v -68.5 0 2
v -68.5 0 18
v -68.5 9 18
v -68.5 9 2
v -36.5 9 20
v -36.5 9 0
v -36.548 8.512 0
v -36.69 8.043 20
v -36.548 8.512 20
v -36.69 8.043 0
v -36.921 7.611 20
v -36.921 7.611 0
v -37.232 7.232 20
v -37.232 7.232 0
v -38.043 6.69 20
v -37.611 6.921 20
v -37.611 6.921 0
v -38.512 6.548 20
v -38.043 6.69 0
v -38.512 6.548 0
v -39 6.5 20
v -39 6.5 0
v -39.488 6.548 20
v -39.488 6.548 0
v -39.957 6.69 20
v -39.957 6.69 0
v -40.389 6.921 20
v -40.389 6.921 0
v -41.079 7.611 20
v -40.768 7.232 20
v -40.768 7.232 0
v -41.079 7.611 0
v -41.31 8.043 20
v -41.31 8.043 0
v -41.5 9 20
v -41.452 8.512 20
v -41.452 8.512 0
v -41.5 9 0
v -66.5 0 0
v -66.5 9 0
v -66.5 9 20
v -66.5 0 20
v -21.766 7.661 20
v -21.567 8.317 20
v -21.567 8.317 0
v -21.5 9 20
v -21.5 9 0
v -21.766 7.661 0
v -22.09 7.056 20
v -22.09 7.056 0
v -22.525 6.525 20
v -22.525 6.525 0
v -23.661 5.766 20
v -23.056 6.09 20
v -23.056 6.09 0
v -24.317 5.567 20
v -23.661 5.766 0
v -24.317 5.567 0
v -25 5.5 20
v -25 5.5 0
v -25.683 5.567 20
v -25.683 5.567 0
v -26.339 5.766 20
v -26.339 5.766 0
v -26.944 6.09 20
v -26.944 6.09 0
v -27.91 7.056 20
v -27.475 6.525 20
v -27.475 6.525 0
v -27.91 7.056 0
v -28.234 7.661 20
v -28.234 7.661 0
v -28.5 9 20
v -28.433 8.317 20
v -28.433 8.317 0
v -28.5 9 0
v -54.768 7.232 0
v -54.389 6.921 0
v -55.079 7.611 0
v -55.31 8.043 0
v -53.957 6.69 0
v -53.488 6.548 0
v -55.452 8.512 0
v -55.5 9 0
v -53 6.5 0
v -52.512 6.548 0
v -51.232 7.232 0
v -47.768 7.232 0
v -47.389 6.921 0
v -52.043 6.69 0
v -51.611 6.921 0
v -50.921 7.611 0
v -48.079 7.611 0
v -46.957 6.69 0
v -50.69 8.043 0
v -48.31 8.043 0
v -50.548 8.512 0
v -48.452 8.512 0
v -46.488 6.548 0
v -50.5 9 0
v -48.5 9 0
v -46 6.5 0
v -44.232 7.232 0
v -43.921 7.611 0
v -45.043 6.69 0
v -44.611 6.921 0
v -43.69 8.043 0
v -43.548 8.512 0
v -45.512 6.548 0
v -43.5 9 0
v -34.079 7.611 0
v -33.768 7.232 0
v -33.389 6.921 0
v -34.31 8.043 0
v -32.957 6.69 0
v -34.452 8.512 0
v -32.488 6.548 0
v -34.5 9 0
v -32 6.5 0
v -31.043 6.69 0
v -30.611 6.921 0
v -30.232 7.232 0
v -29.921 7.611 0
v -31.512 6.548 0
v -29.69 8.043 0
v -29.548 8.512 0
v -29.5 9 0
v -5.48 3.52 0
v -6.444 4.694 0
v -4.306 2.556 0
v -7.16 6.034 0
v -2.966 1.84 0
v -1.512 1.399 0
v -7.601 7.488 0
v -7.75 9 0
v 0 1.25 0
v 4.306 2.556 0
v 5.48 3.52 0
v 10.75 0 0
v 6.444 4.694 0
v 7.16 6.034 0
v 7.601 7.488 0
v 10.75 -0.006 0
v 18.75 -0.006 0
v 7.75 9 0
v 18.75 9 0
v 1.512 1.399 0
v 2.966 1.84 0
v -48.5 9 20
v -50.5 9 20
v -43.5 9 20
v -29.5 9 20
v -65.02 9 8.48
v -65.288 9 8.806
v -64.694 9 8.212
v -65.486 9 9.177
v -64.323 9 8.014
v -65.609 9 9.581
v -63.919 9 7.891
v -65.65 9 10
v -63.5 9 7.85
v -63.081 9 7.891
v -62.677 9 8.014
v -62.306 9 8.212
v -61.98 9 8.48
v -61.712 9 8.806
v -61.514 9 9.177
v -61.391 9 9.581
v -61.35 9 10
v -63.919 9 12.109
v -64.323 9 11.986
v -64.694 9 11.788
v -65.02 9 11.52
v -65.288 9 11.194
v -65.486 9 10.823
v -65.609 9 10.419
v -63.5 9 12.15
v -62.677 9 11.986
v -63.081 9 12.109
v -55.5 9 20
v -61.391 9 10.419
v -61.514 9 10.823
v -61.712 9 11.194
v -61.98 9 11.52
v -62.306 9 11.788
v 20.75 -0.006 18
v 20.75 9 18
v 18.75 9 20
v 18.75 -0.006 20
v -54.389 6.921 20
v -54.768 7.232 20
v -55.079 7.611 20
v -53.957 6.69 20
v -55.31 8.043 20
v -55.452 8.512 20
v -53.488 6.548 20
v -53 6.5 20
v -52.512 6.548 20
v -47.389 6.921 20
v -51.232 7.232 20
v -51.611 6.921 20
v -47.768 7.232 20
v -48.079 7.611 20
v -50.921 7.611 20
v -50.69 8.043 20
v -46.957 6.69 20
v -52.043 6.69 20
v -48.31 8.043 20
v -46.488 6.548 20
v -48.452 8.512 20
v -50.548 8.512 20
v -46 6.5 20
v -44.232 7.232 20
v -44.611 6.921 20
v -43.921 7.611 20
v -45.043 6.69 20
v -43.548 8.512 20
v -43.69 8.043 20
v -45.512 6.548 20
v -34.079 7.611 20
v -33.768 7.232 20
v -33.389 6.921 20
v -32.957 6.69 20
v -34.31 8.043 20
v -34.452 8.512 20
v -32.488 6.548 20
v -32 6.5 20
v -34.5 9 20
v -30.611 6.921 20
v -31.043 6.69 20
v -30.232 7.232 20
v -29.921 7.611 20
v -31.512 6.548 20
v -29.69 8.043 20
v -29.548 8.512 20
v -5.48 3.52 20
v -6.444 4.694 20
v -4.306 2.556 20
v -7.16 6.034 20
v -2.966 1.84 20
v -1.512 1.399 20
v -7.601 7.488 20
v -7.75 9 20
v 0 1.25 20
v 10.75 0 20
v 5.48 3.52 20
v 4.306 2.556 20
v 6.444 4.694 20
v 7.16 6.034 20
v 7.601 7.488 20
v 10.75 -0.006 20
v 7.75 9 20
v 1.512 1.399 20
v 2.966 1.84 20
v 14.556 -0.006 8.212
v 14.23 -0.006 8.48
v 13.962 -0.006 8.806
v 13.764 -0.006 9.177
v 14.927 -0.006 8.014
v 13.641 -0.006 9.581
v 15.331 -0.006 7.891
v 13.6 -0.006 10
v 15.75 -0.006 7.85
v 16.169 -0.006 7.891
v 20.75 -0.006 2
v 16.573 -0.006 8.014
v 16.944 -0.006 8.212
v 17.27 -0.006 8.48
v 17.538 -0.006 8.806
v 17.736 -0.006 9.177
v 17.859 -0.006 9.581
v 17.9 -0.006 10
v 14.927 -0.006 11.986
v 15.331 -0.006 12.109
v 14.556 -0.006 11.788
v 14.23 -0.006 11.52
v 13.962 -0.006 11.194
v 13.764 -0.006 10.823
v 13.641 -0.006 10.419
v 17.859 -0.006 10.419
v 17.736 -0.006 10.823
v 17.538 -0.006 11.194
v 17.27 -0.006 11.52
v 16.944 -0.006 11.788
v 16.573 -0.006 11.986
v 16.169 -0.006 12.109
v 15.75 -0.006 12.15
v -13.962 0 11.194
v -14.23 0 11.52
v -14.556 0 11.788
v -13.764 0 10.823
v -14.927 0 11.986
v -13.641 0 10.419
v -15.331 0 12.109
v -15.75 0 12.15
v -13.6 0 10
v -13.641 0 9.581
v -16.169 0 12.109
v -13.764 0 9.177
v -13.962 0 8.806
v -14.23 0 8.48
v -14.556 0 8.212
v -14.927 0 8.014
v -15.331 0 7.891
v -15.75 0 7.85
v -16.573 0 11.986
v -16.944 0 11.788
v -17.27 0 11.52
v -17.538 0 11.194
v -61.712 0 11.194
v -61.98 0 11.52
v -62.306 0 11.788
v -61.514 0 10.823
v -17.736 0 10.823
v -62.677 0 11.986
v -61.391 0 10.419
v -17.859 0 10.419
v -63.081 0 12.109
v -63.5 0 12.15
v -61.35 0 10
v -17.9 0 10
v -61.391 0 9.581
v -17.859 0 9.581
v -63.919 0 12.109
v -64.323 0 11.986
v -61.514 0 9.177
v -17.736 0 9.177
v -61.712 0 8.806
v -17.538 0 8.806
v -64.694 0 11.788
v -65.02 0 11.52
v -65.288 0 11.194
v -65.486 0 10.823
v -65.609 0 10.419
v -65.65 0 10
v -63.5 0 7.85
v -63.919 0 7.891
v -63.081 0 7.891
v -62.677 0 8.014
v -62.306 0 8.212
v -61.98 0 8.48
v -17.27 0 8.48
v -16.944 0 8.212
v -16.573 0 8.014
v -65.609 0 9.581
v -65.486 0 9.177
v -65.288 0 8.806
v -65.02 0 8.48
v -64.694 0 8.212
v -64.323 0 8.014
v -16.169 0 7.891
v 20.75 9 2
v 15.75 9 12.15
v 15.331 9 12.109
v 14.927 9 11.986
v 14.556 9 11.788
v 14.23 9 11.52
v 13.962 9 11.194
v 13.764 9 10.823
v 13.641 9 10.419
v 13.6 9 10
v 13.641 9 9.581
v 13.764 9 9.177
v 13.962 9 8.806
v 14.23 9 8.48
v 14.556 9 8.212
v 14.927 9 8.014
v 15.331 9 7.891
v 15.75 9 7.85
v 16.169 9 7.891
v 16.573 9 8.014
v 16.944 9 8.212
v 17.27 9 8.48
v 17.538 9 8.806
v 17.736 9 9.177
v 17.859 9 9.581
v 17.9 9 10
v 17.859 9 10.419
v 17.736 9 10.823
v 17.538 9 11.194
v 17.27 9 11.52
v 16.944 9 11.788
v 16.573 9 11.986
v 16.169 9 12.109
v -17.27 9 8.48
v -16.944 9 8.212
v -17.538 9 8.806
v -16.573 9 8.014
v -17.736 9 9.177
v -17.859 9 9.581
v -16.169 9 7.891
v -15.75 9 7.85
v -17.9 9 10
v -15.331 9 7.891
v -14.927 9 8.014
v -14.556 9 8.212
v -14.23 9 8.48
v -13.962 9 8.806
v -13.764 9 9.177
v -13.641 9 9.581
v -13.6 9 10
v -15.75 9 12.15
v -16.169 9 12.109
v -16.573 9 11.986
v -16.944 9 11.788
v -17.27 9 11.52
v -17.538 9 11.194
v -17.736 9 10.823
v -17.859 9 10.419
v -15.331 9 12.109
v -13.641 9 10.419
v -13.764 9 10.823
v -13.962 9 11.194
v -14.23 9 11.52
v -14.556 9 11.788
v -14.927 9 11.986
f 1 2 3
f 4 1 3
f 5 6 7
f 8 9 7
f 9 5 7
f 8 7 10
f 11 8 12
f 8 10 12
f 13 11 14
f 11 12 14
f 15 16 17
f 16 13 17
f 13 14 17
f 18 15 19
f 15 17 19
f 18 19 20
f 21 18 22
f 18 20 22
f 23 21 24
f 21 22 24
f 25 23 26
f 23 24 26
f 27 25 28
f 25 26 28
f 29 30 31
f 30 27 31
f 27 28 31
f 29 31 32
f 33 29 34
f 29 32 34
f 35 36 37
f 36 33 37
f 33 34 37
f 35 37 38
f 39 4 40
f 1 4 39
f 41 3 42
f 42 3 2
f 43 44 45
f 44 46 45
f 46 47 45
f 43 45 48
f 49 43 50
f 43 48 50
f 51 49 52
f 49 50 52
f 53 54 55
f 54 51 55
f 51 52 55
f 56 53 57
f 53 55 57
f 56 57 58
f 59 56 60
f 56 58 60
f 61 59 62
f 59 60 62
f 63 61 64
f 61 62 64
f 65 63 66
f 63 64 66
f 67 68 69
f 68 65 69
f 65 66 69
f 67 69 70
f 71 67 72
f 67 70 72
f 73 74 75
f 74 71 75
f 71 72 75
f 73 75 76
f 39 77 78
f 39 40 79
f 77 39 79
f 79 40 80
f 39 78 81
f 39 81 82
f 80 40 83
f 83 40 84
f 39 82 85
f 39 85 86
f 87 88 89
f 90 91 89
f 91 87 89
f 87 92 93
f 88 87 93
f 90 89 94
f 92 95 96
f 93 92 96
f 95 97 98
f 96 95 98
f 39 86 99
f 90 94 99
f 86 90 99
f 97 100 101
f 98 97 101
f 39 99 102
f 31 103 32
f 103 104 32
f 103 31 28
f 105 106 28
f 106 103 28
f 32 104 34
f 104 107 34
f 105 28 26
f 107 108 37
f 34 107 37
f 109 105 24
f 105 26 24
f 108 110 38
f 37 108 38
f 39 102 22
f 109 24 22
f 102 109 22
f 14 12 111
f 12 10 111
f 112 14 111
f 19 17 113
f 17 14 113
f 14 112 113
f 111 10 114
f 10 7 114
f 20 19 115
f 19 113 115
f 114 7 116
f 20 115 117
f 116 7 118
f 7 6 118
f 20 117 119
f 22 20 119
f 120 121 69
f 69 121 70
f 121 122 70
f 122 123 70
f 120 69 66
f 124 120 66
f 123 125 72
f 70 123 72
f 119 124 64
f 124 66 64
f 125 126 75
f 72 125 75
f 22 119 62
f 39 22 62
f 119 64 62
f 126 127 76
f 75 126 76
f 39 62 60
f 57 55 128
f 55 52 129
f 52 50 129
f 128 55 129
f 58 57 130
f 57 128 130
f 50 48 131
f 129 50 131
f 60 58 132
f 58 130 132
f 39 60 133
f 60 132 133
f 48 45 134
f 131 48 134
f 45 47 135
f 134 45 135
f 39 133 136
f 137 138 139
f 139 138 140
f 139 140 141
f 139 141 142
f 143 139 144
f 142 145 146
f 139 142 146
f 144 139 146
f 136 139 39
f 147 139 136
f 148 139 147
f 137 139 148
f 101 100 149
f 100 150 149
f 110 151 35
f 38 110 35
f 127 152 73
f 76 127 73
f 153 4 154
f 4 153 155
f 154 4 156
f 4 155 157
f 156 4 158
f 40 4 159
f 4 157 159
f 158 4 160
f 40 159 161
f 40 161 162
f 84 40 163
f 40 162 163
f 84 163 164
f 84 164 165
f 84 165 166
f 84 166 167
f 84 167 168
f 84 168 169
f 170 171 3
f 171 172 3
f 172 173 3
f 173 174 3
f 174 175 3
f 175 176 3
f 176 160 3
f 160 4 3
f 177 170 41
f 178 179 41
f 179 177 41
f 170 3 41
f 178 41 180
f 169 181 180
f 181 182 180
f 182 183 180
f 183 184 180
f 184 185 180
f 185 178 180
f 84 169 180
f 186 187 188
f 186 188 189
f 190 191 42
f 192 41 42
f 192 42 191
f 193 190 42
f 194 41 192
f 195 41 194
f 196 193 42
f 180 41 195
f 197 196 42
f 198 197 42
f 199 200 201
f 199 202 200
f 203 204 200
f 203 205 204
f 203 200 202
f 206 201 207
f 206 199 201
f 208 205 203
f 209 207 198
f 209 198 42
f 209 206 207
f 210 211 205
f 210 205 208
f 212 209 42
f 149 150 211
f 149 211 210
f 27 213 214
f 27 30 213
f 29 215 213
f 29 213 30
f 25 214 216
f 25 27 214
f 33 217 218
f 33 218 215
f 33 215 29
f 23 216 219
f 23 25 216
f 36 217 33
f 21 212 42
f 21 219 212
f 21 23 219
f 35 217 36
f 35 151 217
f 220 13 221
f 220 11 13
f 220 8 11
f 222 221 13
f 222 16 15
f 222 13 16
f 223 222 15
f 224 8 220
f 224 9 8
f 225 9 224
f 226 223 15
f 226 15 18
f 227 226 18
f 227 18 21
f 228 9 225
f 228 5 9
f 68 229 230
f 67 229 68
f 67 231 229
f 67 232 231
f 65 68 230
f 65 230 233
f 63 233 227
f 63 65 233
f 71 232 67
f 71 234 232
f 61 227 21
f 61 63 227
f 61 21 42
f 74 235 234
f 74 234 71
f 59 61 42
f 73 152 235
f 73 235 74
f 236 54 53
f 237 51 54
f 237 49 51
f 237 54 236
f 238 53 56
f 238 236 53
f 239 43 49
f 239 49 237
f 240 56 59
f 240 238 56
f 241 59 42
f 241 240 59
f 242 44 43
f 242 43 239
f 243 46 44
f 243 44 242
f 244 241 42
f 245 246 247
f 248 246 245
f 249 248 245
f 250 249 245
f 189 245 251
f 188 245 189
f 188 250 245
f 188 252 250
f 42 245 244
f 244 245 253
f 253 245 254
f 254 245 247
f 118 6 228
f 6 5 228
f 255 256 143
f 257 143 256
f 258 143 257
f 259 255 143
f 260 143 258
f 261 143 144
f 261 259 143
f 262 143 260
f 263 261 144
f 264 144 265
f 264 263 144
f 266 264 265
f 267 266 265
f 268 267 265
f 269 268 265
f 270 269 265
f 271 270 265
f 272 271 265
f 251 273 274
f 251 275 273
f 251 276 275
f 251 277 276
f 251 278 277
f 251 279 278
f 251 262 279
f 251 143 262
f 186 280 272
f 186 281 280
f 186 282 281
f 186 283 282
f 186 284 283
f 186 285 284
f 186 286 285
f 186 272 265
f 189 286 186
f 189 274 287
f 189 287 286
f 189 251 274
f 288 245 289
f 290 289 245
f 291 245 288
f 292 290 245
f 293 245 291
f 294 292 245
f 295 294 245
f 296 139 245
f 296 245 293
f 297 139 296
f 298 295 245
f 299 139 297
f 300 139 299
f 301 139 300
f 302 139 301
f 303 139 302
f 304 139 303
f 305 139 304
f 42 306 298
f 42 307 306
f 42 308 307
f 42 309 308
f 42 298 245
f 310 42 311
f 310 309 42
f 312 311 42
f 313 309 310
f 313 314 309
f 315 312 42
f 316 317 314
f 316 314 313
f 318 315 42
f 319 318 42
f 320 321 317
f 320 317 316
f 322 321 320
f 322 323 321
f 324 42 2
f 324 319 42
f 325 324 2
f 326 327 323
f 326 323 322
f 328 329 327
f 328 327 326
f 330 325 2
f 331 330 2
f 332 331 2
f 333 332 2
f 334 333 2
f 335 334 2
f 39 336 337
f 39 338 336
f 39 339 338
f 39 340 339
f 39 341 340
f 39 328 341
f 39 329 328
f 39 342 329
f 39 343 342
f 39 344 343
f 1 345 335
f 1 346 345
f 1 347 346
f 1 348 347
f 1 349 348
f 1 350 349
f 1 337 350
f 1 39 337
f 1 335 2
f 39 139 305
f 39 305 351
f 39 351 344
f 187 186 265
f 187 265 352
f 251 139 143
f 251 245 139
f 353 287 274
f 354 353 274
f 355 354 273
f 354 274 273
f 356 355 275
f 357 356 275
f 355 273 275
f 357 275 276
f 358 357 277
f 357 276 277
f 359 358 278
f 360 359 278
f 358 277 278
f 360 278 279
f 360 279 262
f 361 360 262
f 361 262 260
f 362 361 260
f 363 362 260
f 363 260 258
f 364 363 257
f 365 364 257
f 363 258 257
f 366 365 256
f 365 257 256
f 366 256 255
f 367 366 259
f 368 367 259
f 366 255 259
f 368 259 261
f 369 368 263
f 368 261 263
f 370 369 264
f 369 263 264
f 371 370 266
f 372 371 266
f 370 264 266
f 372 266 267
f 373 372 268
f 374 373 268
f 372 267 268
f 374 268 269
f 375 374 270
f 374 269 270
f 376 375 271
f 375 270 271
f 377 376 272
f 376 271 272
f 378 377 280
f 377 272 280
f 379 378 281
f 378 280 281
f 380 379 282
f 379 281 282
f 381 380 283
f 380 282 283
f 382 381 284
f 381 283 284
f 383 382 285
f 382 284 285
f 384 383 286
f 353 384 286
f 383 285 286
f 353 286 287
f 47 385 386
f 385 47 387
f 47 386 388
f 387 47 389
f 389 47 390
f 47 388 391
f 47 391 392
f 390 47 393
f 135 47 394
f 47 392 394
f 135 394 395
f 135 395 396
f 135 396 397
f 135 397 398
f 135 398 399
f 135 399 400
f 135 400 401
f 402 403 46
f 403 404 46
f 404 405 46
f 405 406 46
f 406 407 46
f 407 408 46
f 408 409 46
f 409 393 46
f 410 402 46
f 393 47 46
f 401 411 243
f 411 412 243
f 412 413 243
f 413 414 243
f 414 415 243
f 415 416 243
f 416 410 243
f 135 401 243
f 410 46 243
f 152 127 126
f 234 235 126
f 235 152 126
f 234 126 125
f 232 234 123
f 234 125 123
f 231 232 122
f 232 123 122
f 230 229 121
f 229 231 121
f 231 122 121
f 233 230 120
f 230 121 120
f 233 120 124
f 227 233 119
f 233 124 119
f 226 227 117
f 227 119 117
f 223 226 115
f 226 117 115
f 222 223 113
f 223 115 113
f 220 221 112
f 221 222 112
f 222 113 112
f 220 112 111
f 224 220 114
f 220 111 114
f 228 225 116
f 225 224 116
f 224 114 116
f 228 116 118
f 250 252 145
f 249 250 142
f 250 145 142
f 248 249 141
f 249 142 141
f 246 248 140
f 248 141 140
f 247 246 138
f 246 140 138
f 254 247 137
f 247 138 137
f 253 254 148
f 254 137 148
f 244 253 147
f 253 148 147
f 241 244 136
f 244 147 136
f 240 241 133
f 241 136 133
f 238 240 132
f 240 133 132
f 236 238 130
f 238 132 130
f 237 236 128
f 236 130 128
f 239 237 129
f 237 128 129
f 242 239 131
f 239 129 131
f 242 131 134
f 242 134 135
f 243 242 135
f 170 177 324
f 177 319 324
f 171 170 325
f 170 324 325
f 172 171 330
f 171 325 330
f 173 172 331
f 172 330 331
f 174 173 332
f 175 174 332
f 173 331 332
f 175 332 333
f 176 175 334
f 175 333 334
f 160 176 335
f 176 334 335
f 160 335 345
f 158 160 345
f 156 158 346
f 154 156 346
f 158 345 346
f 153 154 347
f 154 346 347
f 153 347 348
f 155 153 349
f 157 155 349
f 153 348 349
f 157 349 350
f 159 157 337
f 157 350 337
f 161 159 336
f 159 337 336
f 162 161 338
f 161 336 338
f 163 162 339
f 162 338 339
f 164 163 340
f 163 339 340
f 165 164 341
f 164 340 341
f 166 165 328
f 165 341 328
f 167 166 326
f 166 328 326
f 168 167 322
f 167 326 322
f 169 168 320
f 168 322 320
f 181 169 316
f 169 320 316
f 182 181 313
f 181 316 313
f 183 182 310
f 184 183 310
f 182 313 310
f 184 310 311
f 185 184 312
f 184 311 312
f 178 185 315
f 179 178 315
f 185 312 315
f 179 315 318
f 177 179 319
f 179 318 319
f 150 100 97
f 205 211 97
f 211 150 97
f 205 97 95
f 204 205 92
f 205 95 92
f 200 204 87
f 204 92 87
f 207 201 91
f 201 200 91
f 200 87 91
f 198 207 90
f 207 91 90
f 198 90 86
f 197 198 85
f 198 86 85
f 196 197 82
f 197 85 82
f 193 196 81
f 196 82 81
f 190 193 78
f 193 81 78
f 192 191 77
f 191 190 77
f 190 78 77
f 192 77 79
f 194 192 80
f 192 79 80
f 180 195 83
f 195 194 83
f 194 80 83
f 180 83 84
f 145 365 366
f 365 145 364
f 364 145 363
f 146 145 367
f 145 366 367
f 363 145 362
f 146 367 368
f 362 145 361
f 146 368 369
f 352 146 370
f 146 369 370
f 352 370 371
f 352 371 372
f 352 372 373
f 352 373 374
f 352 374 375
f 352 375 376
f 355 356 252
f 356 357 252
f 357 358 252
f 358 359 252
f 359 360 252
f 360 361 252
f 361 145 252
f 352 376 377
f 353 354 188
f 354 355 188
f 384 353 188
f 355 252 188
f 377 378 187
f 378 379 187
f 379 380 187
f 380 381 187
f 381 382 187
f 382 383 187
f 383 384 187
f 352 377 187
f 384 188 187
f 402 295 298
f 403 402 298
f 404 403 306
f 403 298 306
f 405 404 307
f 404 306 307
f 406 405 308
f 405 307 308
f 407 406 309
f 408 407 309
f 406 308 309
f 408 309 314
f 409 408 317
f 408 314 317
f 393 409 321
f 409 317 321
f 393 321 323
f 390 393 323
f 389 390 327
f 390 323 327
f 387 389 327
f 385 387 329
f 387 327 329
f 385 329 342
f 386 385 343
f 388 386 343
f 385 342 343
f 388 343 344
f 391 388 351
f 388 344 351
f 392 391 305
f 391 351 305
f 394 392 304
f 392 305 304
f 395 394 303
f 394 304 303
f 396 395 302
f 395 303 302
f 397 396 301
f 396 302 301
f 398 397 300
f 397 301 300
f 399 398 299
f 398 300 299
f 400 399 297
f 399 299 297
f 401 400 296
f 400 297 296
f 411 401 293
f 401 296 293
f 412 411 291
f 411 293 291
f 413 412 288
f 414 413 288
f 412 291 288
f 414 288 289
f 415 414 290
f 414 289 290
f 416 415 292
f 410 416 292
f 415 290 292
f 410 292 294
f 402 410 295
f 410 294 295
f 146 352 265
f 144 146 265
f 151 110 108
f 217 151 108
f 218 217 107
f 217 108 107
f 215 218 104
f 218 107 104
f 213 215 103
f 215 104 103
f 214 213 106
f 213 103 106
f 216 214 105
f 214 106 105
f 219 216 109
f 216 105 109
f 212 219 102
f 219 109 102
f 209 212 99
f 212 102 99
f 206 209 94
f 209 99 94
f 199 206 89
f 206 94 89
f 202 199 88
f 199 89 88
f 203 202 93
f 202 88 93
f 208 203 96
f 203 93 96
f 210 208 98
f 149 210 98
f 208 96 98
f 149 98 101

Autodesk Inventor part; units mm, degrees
ref_plane "YZ Plane" through (0, 0, 0) normal (1, 0, 0) x (0, 1, 0)
ref_plane "XZ Plane" through (0, 0, 0) normal (0, 1, 0) x (-1, 0, 0)
ref_plane "XY Plane" through (0, 0, 0) normal (0, 0, 1) x (1, 0, 0)
sketch "スケッチ1" plane through (0, 0, 0) normal (0, 0, 1) x (1, 0, 0)
  circle A0 centre (0, 9) radius 7.75
  line L0 (10.75, 0) -> (-58.5, 0)
  line L1 (-58.5, 0) -> (-58.5, 1.25)
  line L2 (-58.5, 1.25) -> (10.75, 1.25)
  line L3 (10.75, 1.25) -> (10.75, 0)
  circle A1 centre (0, 9) radius 10.75
  line L4 (10.75, 1.25) -> (10.75, 15.8822)
  circle A2 centre (-32, 9) radius 2.5
  circle A3 centre (-39, 9) radius 2.5
  circle A4 centre (-25, 9) radius 3.5
  circle A5 centre (-46, 9) radius 2.5
  circle A6 centre (-53, 9) radius 2.5
  circle A7 centre (-53, 9) radius 5.5
  line L5 (-58.5, 1.25) -> (-58.5, 21.0928)
  line L6 (-61.1769, 14.5) -> (16.6826, 14.5)
  point P0 (0, 0)
  point P1 (-9.2365, 14.5)
  point P2 (-58.5, 14.5)
  point P3 (10.75, 14.5)
  point P4 (9.2365, 14.5)
  point P5 (10.75, 9)
  point P6 (5.879, 0)
  point P7 (-5.879, 0)
  dimension "d0" = 15.5
  dimension "d1" = 3
  dimension "d2" = 5
  dimension "d3" = 5
  dimension "d4" = 7
  dimension "d5" = 5
  dimension "d7" = 7
  dimension "d8" = 7
  dimension "d9" = 25
  dimension "d10" = 7
  dimension "d11" = 5
  dimension "d12" = 7
  dimension "d13" = 3
  dimension "d16" = 9
extrude "押し出し1" add sketch "スケッチ1" along normal blind 20 contours A0 L6 A1 L2 | A0 L6 A1 | L2 A1 L6 A0 | L2 A1 L0 | L6 L4 A1 | A1 L0 L1 L2 | L2 L5 A7 A5 L6 A1 | A1 L4 L2 | L2 L3 L0 A1 | A7 A5 | A7 L5 L6 picked at (-49.0972, 10.8197)
sketch "スケッチ3" plane through (0, 0, 20) normal (0, 0, 1) x (1, 0, 0)
  line L0 (-9.2365, 14.5) -> (-58.5, 14.5) projected
  line L1 (-58.5, 14.5) -> (-58.5, 0) projected
  line L2 (-58.5, 0) -> (10.75, 0) projected
  arc A0 (9.2365, 14.5) -> (-9.2365, 14.5) centre (0, 9) ccw projected
  circle A1 centre (0, 9) radius 7.75 projected
  circle A2 centre (-53, 9) radius 2.5 projected
  circle A3 centre (-25, 9) radius 3.5 projected
  circle A4 centre (-39, 9) radius 2.5 projected
  circle A5 centre (-32, 9) radius 2.5 projected
  circle A6 centre (-46, 9) radius 2.5 projected
  line L3 (-58.5, 14.5) -> (-58.5, 0) projected
  line L4 (-58.5, 0) -> (-68.5, 0)
  line L5 (-68.5, 0) -> (-68.5, 14.5)
  line L6 (-68.5, 14.5) -> (-58.5, 14.5)
  line L7 (-58.5, 14.5) -> (-58.5, 0)
  line L8 (10.75, -0.0065) -> (20.75, -0.0065)
  line L9 (20.75, -0.0065) -> (20.75, 14.5)
  line L10 (20.75, 14.5) -> (10.75, 14.5)
  line L11 (10.75, 14.5) -> (10.75, -0.0065)
  line L12 (10.75, 0) -> (10.75, 14.5) projected
  line L13 (10.75, 14.5) -> (9.2365, 14.5) projected
  point P0 (0, 0)
  dimension "d17" = 10
  dimension "d18" = 10
extrude "押し出し2" add sketch "スケッチ3" against normal up to surface (20 mm away) contours L1 L4 L5 L6 | L10 L9 L8 L11
sketch "スケッチ4" plane through (0, 0, 20) normal (0, 0, 1) x (1, 0, 0)
  line L0 (-9.2365, 14.5) -> (-68.5, 14.5) projected
  line L1 (-68.5, 14.5) -> (-68.5, 0) projected
  line L2 (-68.5, 0) -> (10.75, 0) projected
  line L3 (20.75, -0.0065) -> (20.75, 14.5) projected
  line L4 (20.75, 14.5) -> (9.2365, 14.5) projected
  arc A0 (9.2365, 14.5) -> (-9.2365, 14.5) centre (0, 9) ccw projected
  circle A1 centre (0, 9) radius 7.75 projected
  circle A2 centre (-53, 9) radius 2.5 projected
  circle A3 centre (-25, 9) radius 3.5 projected
  circle A4 centre (-39, 9) radius 2.5 projected
  circle A5 centre (-32, 9) radius 2.5 projected
  circle A6 centre (-46, 9) radius 2.5 projected
  line L5 (-68.5, 0) -> (-68.5, 14.5) projected
  line L6 (-68.5, 9) -> (20.75, 9)
  line L7 (20.75, 9) -> (20.75, 30.4065)
  line L8 (20.75, 30.4065) -> (-68.5, 30.4065)
  line L9 (-68.5, 30.4065) -> (-68.5, 9)
  line L10 (10.75, 0) -> (10.75, -0.0065) projected
  line L11 (10.75, -0.0065) -> (20.75, -0.0065) projected
  point P0 (0, 0)
  point P1 (-55.5, 9)
  point P2 (-40.5, 9)
  point P3 (-48.5, 9)
  point P4 (-33.5, 9)
  point P5 (-41.5, 9)
  point P6 (-26.5, 9)
  point P7 (-34.5, 9)
  point P8 (-19.5, 9)
  point P9 (-18.5, 9)
  point P10 (-21.5, 9)
  point P11 (7.75, 9)
  point P12 (7.75, 9)
  point P13 (10.75, 9)
  point P14 (-21.5, 9)
  point P15 (-28.5, 9)
  point P16 (-29.5, 9)
  point P17 (-29.5, 9)
  point P18 (-36.5, 9)
  point P19 (-36.5, 9)
  point P20 (-43.5, 9)
  point P21 (-43.5, 9)
  point P22 (-50.5, 9)
  point P23 (-50.5, 9)
  point P24 (-68.5, 14.5065)
  point P25 (20.75, 14.5)
  point P26 (-68.5, 14.5)
  point P27 (20.75, 14.5)
extrude "押し出し3" cut sketch "スケッチ4" against normal through all contours A0 L4 L3 L6 A1 A3 A5 A4 A6 A2 L1 L0 | L0 L9 L8 L7 L4 A0 | A2 L6 | L6 A1 | A6 L6 | L6 A3 | A4 L6 | L6 A5 picked at (-52.3762, 9.5526) picked at (1.4675, 11.126) picked at (-45.3762, 9.5526) picked at (-24.5863, 10.0909) picked at (-38.3762, 9.5526) picked at (-32.7192, 9.9399)
sketch "スケッチ6" plane through (7.75, 9, 20) normal (0, 1, 0) x (1, 0, 0)
  line L0 (0, 0) -> (0, 20) projected
  line L1 (13, 0) -> (0, 0) projected
  line L2 (13, 20) -> (13, 0) projected
  line L3 (-29.25, 0) -> (-29.25, 20) projected
  line L4 (-15.5, 0) -> (-29.25, 0) projected
  line L5 (-15.5, 20) -> (-15.5, 0) projected
  line L6 (-63.25, 20) -> (-63.25, 0) projected
  line L7 (-76.25, 0) -> (-76.25, 20) projected
  line L8 (-63.25, 0) -> (-76.25, 0) projected
  line L9 (-76.25, 20) -> (-63.25, 20) projected
  line L10 (-29.25, 20) -> (-15.5, 20) projected
  line L11 (0, 20) -> (13, 20) projected
  point P0 (-7.75, 20)
  point P1 (8, 10)
  point P2 (-23.5, 10)
  point P3 (-71.25, 10)
  dimension "d33" = 10
  dimension "d34" = 5
  dimension "d35" = 5
  dimension "d36" = 15.75
hole "穴2" at (15.75, 9, 10) at (-15.75, 9, 10) at (-63.5, 9, 10) direction (0, -1, 0) diameter 4.3 end through all
chamfer "面取り1" distance 2 angle 45 4 edges at (20.75, 4.4968, 0) (20.75, 4.4968, 20) (-68.5, 4.5, 0) (-68.5, 4.5, 20)
properties part number "C_Unit_Cable_Holder_B"
